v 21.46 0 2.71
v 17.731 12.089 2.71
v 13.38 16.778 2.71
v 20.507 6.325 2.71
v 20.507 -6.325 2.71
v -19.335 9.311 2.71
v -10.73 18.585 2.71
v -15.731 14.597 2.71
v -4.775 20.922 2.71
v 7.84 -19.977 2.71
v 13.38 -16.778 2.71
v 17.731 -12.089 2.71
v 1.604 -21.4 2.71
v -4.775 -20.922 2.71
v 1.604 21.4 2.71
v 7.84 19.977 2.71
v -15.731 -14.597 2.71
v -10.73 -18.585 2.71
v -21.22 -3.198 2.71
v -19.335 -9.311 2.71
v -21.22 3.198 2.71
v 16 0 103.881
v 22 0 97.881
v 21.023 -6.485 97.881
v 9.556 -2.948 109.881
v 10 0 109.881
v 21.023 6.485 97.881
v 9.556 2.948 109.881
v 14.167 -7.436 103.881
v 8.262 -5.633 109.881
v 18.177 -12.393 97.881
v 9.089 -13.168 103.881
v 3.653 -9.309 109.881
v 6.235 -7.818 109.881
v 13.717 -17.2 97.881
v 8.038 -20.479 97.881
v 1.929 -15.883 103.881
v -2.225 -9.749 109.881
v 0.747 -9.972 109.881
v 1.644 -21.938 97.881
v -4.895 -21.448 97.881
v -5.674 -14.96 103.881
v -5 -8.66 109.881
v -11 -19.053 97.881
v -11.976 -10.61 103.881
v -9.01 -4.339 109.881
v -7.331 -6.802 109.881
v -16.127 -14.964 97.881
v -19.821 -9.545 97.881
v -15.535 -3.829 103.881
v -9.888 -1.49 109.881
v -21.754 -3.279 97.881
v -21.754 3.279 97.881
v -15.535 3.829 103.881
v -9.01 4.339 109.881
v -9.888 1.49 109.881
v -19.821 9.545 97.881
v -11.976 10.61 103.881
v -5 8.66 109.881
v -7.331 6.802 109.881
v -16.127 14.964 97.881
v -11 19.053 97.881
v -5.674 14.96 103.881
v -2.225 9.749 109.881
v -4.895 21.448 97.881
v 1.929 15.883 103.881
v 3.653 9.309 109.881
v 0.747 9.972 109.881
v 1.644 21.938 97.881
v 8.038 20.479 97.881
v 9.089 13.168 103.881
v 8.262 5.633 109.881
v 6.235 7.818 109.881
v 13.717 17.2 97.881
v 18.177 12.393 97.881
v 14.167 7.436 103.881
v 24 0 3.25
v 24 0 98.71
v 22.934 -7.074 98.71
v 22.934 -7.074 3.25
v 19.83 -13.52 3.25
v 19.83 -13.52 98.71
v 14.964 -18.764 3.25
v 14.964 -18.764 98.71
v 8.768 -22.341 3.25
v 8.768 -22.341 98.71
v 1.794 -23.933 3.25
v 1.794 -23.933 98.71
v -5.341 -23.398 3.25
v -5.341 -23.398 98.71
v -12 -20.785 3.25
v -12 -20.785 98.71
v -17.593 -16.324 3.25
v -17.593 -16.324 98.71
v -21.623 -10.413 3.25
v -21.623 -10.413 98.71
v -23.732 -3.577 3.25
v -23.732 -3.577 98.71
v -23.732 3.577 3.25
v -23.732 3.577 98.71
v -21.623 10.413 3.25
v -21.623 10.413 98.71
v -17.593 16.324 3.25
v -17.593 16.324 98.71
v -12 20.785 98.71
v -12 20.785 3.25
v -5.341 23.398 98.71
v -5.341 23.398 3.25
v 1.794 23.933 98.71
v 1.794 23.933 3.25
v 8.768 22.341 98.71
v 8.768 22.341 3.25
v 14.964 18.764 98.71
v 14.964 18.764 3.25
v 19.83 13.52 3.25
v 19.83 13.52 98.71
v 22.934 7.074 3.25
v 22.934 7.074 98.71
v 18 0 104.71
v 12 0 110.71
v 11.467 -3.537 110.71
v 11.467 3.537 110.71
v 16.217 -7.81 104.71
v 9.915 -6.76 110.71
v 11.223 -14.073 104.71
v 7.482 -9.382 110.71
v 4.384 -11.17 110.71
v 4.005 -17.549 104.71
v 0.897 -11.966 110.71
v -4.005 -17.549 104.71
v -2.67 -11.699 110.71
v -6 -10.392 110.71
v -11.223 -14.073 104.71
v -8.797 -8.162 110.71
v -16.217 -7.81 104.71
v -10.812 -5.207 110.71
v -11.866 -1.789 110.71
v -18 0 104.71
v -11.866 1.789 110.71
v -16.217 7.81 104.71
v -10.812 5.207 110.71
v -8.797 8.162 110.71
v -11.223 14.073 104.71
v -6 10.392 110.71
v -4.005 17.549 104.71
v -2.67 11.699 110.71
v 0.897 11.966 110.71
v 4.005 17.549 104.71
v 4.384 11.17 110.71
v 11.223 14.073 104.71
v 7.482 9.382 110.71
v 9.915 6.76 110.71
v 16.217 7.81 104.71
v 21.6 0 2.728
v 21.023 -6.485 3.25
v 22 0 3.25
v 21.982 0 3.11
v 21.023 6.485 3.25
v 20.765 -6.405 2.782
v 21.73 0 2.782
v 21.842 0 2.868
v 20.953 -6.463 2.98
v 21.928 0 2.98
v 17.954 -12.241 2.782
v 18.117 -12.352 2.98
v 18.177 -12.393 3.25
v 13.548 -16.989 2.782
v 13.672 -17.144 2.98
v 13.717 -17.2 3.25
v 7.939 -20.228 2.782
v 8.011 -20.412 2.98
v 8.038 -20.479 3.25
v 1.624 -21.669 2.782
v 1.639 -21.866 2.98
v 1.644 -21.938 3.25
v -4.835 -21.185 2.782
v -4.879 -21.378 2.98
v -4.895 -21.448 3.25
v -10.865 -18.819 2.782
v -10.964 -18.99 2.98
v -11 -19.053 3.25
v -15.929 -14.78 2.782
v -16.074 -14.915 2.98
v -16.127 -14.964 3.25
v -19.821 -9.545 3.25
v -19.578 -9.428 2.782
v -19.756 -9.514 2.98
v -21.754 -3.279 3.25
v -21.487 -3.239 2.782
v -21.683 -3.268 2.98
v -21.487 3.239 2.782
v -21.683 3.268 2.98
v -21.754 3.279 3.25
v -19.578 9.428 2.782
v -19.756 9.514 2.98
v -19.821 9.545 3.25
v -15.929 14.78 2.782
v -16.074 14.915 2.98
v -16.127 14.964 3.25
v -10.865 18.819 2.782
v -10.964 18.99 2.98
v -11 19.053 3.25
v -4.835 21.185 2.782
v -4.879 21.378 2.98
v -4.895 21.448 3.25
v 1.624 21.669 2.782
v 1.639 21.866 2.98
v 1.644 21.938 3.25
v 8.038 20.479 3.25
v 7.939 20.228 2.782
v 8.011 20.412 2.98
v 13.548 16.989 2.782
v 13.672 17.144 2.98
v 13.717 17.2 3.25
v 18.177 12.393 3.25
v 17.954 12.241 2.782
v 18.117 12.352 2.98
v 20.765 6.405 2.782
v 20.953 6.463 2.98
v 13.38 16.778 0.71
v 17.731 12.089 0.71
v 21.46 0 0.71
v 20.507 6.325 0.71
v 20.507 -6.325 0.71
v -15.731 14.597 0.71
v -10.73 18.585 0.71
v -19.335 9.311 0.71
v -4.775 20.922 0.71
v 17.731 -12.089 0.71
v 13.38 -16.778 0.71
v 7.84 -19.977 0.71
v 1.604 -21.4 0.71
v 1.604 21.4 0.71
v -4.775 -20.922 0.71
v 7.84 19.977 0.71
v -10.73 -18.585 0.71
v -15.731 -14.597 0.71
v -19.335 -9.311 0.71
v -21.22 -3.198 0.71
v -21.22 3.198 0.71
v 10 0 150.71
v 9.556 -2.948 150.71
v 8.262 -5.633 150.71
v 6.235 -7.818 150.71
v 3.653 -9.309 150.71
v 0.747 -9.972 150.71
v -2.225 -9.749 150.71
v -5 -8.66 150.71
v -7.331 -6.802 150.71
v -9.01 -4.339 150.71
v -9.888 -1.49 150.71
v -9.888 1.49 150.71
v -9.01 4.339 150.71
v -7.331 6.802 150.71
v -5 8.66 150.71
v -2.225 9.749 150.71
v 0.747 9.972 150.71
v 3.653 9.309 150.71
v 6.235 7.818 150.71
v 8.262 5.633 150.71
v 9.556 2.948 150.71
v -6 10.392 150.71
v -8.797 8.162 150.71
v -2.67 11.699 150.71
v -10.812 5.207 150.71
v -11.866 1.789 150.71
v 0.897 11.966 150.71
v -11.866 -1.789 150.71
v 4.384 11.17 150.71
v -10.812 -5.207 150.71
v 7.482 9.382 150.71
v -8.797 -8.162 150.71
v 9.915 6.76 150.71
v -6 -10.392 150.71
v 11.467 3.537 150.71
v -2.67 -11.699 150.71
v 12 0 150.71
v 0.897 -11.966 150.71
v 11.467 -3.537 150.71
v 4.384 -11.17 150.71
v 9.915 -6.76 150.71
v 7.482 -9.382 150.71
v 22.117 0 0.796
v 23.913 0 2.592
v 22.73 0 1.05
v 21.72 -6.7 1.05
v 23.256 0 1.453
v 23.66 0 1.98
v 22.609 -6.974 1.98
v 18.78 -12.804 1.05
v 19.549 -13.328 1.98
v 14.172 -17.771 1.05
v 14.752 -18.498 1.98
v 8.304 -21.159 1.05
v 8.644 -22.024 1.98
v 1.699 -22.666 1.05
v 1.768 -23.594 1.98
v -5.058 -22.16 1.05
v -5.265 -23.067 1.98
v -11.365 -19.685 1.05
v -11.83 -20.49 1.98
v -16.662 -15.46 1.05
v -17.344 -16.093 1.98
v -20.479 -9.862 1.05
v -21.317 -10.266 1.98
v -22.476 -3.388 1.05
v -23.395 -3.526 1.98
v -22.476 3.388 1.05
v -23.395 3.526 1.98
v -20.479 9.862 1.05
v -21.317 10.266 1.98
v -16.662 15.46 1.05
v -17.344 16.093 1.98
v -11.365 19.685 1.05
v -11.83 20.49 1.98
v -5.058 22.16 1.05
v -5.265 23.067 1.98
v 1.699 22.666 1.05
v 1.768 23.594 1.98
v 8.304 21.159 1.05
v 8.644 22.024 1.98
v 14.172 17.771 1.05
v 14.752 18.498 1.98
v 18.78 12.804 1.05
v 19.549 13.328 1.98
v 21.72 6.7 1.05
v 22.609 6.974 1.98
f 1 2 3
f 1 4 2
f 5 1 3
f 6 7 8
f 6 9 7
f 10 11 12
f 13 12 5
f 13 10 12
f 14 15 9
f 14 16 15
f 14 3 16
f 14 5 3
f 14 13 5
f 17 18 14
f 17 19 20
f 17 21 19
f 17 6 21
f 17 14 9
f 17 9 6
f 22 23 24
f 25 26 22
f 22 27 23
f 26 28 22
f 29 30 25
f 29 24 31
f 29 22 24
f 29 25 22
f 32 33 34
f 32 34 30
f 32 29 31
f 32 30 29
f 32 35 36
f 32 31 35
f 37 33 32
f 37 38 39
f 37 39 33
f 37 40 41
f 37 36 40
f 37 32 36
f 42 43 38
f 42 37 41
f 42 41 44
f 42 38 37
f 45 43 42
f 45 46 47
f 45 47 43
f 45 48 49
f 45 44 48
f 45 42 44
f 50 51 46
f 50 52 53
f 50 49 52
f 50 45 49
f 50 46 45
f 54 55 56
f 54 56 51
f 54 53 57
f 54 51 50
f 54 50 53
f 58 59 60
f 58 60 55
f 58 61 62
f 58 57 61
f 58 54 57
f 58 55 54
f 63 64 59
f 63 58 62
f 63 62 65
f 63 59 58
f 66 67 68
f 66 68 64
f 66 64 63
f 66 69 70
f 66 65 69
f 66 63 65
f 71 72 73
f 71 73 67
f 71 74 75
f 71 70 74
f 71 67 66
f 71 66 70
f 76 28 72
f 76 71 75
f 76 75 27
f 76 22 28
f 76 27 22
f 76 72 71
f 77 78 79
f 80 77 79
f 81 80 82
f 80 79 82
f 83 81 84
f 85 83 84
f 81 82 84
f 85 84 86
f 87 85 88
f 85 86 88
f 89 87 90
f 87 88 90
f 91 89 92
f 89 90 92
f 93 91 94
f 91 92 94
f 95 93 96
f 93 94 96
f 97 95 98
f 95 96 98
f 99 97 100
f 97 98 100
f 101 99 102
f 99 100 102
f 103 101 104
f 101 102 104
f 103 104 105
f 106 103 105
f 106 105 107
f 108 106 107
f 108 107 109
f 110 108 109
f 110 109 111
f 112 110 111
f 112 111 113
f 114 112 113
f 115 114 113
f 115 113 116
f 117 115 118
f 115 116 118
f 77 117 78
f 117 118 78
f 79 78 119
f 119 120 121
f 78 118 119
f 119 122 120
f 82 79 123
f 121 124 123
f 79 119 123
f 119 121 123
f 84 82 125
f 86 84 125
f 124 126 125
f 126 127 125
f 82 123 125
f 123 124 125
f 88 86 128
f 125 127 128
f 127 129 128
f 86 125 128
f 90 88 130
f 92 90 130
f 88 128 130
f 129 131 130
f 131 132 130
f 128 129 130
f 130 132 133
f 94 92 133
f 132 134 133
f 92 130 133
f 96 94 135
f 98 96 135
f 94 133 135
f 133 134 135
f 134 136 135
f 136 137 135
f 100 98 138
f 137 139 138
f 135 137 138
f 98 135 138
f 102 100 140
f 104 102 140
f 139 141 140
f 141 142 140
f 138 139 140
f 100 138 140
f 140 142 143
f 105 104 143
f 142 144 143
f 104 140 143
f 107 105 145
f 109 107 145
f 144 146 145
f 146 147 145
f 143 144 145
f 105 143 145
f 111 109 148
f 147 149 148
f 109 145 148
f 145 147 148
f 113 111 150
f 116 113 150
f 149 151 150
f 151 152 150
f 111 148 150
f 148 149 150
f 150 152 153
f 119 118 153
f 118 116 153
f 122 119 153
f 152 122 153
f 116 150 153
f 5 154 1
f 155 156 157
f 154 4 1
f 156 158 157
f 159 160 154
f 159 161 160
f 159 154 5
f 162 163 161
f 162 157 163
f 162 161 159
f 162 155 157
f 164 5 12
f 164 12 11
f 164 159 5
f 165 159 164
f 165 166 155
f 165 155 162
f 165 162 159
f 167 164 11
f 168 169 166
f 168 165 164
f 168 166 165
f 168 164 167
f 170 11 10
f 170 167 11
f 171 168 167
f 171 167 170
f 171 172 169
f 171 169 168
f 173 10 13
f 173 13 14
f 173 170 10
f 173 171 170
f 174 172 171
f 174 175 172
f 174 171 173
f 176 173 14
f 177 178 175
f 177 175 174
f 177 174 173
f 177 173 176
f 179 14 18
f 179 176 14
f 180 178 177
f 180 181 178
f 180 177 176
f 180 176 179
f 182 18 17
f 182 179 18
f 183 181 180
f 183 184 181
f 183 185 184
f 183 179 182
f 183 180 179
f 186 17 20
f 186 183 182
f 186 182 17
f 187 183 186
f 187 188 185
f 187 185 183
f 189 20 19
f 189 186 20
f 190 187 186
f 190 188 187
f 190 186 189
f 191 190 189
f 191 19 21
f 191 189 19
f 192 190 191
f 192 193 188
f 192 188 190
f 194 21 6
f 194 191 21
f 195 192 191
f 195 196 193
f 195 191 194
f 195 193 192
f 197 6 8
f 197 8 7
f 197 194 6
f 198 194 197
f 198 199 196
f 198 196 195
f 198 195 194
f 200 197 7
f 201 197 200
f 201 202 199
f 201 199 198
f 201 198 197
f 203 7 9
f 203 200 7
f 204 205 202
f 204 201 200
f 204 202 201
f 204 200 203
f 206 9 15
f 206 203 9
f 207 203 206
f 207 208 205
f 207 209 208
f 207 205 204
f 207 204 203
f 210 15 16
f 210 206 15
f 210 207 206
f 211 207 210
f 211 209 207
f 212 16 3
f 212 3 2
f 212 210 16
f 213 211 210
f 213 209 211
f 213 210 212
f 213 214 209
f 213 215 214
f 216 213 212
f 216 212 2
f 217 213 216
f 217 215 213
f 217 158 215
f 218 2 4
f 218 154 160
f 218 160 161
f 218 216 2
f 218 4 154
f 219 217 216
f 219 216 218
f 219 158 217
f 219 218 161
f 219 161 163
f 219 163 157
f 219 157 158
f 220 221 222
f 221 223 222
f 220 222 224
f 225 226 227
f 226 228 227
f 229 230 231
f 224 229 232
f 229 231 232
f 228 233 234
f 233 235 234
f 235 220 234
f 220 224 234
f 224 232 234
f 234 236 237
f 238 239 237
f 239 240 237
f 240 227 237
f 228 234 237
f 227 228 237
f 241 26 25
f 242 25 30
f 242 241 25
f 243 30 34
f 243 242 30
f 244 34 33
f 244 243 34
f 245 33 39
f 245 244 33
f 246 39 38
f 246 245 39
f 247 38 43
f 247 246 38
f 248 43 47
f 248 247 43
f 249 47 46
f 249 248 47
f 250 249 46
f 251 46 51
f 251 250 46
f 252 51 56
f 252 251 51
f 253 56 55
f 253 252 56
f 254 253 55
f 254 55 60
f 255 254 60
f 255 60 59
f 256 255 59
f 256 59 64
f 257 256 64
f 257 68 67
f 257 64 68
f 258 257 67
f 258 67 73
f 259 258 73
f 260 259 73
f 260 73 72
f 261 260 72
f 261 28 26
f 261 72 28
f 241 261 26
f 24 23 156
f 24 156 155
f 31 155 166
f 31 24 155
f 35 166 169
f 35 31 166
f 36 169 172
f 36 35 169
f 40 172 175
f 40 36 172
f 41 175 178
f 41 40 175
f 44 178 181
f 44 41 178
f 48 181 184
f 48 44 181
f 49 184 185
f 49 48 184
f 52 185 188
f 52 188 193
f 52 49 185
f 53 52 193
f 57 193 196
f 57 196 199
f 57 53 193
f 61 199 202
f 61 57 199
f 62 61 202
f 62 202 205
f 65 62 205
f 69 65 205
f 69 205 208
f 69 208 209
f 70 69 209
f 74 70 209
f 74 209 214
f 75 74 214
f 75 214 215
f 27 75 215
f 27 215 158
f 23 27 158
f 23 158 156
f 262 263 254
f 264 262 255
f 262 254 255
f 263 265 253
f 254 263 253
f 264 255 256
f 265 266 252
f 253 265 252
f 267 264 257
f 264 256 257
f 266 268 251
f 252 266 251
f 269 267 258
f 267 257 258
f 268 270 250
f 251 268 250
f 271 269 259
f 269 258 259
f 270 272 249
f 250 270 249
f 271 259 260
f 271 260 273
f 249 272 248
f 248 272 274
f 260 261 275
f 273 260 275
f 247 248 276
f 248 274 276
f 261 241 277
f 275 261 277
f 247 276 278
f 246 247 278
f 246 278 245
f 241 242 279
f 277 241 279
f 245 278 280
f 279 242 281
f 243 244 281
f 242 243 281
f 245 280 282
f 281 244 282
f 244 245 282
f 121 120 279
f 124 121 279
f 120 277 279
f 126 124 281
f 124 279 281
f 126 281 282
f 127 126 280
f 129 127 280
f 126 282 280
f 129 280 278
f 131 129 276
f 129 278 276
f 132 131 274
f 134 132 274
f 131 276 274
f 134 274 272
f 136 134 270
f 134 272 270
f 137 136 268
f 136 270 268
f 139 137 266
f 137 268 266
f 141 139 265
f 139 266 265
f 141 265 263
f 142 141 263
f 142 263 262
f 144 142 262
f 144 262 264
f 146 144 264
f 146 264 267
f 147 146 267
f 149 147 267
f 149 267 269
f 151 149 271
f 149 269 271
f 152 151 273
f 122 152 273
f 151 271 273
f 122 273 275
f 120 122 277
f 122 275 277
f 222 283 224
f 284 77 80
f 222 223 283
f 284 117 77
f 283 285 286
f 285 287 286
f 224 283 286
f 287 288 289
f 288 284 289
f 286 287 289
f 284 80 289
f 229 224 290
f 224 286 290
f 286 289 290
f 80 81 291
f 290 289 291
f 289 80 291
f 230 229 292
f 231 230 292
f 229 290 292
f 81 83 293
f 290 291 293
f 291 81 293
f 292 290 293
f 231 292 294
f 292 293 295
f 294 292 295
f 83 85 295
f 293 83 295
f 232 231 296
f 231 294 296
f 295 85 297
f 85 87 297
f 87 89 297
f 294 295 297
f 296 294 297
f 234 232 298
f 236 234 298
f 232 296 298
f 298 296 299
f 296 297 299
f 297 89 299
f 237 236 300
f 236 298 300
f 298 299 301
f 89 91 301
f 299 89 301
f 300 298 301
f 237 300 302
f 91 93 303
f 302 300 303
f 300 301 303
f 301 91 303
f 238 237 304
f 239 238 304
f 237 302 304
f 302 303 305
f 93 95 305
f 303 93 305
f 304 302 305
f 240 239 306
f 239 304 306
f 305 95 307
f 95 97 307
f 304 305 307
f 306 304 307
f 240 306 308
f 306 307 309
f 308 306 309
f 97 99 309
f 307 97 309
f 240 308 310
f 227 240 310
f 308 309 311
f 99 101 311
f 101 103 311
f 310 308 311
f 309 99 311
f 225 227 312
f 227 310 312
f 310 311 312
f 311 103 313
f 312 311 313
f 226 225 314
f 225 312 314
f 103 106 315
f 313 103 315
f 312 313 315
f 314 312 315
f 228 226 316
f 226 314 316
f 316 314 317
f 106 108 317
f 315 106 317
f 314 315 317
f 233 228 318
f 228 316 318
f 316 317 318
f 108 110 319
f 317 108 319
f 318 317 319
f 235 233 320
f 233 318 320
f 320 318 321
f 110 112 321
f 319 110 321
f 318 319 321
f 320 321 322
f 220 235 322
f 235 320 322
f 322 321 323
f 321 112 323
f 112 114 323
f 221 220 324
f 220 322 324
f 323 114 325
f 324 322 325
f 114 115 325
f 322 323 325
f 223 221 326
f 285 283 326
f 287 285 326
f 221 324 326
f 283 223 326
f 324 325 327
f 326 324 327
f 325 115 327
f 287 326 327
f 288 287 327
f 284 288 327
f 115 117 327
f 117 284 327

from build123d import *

# Parameters (mm, degrees)
F2_R = 2.54
F3_T = -2


with BuildPart() as f1:
    # F0 (on Front) → F1 (revolve)
    with BuildSketch(Plane.XZ):
        Polygon((0, 150.7095229592), (0, 0.7095229592), (24, 0.7095229592), (24, 98.7095229592), (12, 110.7095229592), (12, 150.7095229592), align=None)
    revolve(axis=Axis((0, 0, 75.7095229592), (0, 0, -1)))

    # F2
    f2_edges = [f1.edges().sort_by_distance(p)[0] for p in [
        (-24, 0, 0.709523),
    ]]
    fillet(f2_edges, radius=F2_R)

    # F3
    f3_openings = [f1.faces().sort_by_distance(p)[0] for p in [
        (0, 0, 150.709523),
    ]]
    offset(amount=F3_T, openings=f3_openings, kind=Kind.INTERSECTION)


solid = f1.part
